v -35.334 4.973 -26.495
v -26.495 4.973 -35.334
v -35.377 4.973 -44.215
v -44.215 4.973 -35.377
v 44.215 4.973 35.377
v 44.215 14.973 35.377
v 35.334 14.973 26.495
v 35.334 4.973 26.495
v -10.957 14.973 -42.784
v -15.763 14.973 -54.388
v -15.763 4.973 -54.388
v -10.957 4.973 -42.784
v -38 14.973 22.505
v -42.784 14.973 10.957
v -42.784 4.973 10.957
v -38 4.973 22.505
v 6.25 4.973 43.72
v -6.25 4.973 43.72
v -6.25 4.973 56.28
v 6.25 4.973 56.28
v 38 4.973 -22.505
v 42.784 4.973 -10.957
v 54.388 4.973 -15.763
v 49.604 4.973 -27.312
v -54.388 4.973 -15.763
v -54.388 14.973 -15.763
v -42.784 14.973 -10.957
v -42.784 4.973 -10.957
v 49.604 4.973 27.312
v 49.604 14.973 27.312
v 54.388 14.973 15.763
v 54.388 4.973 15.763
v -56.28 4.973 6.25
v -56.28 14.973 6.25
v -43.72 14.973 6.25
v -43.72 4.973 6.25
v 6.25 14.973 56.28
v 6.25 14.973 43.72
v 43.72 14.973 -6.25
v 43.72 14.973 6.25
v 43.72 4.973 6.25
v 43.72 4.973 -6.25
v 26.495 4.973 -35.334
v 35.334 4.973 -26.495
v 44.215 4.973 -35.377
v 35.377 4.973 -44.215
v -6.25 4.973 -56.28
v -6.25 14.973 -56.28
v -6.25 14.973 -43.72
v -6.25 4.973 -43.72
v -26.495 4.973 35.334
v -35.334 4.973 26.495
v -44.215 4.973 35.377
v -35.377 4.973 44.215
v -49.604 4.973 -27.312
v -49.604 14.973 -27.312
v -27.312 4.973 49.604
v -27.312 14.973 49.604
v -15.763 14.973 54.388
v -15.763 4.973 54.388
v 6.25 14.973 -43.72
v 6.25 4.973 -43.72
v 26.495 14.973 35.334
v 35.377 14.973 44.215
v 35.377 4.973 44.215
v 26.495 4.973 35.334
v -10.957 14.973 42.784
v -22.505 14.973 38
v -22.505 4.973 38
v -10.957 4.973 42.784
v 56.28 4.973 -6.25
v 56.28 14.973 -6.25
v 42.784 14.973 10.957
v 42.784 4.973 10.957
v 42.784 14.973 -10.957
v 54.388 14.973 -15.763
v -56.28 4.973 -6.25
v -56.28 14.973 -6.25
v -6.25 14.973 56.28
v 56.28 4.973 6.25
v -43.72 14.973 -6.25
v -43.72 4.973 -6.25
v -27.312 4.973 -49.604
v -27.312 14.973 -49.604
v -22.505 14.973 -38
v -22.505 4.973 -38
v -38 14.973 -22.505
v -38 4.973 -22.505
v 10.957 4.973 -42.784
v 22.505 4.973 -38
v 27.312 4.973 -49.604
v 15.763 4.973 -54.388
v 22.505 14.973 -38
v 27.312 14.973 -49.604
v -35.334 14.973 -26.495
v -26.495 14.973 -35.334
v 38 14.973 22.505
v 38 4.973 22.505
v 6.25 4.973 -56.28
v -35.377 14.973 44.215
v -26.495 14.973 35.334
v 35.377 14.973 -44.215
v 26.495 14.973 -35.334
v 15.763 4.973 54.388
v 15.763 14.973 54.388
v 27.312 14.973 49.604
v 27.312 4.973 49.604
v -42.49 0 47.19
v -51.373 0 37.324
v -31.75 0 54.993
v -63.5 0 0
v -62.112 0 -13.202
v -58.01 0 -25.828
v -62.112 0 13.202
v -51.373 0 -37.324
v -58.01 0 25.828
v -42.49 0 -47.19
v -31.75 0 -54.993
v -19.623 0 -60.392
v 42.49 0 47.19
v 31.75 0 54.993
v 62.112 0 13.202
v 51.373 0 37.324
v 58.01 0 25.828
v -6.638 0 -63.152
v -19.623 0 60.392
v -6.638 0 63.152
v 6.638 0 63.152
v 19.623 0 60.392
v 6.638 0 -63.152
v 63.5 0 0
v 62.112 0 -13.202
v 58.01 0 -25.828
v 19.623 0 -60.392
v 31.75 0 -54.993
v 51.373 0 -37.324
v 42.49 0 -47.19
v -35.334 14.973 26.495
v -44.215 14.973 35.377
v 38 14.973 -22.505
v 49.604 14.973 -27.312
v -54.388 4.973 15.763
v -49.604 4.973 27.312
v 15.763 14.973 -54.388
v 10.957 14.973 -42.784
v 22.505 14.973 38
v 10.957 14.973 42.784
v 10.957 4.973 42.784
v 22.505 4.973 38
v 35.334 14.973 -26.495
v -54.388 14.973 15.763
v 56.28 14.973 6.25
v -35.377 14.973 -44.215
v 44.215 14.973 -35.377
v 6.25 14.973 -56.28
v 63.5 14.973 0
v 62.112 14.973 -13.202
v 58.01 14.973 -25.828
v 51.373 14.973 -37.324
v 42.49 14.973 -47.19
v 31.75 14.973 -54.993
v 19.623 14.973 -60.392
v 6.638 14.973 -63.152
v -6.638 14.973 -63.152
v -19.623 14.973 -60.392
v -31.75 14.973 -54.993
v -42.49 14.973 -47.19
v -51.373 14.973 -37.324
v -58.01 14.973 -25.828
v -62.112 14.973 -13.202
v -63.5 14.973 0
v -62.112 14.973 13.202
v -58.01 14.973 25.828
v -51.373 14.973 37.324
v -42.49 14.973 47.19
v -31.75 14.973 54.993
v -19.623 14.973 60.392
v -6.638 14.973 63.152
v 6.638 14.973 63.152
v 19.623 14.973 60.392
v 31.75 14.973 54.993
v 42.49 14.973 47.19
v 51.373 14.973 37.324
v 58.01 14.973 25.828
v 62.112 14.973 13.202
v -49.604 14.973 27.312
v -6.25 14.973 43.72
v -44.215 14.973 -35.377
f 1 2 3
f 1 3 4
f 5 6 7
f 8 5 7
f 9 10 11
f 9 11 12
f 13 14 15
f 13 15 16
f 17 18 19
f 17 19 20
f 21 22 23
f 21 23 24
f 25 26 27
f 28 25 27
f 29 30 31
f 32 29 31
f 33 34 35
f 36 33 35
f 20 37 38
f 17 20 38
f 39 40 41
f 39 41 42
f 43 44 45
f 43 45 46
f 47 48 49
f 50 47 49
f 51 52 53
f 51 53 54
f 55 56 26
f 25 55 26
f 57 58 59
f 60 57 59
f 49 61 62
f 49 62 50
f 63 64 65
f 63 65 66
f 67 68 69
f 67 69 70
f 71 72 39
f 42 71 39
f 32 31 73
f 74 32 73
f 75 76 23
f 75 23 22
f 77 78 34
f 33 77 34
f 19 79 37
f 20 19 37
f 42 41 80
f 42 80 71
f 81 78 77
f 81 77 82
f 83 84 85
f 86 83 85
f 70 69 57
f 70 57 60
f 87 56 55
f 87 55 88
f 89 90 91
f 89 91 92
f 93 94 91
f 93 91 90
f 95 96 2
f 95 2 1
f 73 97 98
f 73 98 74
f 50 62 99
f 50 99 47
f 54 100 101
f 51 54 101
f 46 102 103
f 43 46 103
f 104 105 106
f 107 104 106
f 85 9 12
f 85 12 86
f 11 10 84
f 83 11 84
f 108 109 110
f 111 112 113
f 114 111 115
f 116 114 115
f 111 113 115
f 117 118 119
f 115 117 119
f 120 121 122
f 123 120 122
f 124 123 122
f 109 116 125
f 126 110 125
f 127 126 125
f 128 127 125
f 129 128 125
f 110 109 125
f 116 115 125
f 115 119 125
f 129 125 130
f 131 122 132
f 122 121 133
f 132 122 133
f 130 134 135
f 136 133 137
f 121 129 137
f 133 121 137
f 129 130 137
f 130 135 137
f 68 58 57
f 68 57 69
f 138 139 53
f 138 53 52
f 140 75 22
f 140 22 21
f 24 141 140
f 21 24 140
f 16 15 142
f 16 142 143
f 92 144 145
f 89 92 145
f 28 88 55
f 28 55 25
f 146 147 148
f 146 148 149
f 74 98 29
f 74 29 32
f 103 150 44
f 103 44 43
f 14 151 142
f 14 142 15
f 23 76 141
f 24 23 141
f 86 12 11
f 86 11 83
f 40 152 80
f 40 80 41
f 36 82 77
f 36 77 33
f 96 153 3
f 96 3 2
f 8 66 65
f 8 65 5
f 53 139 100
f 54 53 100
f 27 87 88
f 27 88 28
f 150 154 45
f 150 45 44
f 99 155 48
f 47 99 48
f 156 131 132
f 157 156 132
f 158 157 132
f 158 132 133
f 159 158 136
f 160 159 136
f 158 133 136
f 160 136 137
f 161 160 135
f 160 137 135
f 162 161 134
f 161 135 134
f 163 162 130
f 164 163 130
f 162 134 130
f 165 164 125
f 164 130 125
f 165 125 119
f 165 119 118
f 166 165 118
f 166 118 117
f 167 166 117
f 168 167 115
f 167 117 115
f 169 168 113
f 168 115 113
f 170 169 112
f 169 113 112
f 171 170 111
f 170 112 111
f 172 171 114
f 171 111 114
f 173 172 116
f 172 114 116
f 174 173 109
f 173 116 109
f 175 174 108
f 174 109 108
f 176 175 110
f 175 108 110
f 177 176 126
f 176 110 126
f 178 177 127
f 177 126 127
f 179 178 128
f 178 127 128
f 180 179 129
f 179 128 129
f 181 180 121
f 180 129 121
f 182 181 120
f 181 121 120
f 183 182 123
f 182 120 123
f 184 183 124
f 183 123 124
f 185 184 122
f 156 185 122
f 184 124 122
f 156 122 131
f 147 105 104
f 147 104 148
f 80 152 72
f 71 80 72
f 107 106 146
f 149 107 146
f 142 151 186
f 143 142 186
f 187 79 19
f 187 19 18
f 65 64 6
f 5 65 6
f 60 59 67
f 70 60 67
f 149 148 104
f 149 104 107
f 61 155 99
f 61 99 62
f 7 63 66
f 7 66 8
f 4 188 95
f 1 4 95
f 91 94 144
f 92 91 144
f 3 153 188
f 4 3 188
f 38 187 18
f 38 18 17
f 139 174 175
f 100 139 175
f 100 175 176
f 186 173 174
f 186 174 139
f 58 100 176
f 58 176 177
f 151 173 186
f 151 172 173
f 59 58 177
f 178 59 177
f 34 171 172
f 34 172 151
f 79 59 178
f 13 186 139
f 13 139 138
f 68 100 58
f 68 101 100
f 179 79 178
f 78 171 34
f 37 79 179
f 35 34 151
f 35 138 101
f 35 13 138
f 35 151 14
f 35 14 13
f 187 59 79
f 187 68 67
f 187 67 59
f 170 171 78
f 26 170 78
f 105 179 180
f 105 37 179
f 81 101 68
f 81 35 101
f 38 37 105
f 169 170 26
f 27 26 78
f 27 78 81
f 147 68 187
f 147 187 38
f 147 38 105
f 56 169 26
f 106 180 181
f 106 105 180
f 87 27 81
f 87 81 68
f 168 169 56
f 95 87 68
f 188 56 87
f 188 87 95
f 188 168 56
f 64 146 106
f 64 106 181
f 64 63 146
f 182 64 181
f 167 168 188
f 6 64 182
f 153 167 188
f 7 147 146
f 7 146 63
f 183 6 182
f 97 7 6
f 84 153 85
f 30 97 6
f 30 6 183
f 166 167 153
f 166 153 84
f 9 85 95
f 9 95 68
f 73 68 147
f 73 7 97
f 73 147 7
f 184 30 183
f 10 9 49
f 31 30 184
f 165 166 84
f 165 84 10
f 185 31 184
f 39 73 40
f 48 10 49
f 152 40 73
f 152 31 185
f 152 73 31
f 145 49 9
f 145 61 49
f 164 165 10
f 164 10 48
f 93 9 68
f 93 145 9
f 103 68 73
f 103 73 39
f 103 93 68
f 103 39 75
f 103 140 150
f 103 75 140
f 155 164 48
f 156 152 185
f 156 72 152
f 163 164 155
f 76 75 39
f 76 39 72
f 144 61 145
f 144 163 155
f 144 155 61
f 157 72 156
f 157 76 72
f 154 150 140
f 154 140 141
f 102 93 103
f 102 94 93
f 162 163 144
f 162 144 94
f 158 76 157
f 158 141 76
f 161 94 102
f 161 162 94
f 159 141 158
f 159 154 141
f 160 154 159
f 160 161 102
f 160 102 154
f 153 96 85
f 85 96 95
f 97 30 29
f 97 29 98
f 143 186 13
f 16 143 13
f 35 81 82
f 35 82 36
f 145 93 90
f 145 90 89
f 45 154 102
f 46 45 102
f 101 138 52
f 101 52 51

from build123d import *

# Parameters (mm, degrees)
SKETCH1_R           = 63.5
BOSS_EXTRUDE1_DEPTH = 14.973360437
SKETCH2_W           = 12.5
SKETCH2_H           = 12.56
CUT_EXTRUDE1_DEPTH  = 10
CIRPATTERN1_COUNT   = 16


with BuildPart() as part:
    # Sketch1 → Boss-Extrude1 (new body)
    with BuildSketch(Plane(origin=(0, 0, 0), x_dir=(1, 0, 0), z_dir=(0, 1, 0))):
        Circle(SKETCH1_R)
    extrude(amount=BOSS_EXTRUDE1_DEPTH)

    # Sketch2 → Cut-Extrude1 (cut)
    with BuildSketch(Plane(origin=(0, 14.973360437, 0), x_dir=(1, 0, 0), z_dir=(0, 1, 0))):
        with Locations((0, -50)):
            Rectangle(SKETCH2_W, SKETCH2_H)
    cut_extrude1 = extrude(amount=-CUT_EXTRUDE1_DEPTH, mode=Mode.SUBTRACT)

    # CirPattern1: Cut-Extrude1 ×16 about axis
    cirpattern1_axis = Axis((0, 0, 0), (0, 1, 0))
    for i in range(1, CIRPATTERN1_COUNT):
        add(cut_extrude1.rotate(cirpattern1_axis, i * 360 / CIRPATTERN1_COUNT), mode=Mode.SUBTRACT)


solid = part.part
